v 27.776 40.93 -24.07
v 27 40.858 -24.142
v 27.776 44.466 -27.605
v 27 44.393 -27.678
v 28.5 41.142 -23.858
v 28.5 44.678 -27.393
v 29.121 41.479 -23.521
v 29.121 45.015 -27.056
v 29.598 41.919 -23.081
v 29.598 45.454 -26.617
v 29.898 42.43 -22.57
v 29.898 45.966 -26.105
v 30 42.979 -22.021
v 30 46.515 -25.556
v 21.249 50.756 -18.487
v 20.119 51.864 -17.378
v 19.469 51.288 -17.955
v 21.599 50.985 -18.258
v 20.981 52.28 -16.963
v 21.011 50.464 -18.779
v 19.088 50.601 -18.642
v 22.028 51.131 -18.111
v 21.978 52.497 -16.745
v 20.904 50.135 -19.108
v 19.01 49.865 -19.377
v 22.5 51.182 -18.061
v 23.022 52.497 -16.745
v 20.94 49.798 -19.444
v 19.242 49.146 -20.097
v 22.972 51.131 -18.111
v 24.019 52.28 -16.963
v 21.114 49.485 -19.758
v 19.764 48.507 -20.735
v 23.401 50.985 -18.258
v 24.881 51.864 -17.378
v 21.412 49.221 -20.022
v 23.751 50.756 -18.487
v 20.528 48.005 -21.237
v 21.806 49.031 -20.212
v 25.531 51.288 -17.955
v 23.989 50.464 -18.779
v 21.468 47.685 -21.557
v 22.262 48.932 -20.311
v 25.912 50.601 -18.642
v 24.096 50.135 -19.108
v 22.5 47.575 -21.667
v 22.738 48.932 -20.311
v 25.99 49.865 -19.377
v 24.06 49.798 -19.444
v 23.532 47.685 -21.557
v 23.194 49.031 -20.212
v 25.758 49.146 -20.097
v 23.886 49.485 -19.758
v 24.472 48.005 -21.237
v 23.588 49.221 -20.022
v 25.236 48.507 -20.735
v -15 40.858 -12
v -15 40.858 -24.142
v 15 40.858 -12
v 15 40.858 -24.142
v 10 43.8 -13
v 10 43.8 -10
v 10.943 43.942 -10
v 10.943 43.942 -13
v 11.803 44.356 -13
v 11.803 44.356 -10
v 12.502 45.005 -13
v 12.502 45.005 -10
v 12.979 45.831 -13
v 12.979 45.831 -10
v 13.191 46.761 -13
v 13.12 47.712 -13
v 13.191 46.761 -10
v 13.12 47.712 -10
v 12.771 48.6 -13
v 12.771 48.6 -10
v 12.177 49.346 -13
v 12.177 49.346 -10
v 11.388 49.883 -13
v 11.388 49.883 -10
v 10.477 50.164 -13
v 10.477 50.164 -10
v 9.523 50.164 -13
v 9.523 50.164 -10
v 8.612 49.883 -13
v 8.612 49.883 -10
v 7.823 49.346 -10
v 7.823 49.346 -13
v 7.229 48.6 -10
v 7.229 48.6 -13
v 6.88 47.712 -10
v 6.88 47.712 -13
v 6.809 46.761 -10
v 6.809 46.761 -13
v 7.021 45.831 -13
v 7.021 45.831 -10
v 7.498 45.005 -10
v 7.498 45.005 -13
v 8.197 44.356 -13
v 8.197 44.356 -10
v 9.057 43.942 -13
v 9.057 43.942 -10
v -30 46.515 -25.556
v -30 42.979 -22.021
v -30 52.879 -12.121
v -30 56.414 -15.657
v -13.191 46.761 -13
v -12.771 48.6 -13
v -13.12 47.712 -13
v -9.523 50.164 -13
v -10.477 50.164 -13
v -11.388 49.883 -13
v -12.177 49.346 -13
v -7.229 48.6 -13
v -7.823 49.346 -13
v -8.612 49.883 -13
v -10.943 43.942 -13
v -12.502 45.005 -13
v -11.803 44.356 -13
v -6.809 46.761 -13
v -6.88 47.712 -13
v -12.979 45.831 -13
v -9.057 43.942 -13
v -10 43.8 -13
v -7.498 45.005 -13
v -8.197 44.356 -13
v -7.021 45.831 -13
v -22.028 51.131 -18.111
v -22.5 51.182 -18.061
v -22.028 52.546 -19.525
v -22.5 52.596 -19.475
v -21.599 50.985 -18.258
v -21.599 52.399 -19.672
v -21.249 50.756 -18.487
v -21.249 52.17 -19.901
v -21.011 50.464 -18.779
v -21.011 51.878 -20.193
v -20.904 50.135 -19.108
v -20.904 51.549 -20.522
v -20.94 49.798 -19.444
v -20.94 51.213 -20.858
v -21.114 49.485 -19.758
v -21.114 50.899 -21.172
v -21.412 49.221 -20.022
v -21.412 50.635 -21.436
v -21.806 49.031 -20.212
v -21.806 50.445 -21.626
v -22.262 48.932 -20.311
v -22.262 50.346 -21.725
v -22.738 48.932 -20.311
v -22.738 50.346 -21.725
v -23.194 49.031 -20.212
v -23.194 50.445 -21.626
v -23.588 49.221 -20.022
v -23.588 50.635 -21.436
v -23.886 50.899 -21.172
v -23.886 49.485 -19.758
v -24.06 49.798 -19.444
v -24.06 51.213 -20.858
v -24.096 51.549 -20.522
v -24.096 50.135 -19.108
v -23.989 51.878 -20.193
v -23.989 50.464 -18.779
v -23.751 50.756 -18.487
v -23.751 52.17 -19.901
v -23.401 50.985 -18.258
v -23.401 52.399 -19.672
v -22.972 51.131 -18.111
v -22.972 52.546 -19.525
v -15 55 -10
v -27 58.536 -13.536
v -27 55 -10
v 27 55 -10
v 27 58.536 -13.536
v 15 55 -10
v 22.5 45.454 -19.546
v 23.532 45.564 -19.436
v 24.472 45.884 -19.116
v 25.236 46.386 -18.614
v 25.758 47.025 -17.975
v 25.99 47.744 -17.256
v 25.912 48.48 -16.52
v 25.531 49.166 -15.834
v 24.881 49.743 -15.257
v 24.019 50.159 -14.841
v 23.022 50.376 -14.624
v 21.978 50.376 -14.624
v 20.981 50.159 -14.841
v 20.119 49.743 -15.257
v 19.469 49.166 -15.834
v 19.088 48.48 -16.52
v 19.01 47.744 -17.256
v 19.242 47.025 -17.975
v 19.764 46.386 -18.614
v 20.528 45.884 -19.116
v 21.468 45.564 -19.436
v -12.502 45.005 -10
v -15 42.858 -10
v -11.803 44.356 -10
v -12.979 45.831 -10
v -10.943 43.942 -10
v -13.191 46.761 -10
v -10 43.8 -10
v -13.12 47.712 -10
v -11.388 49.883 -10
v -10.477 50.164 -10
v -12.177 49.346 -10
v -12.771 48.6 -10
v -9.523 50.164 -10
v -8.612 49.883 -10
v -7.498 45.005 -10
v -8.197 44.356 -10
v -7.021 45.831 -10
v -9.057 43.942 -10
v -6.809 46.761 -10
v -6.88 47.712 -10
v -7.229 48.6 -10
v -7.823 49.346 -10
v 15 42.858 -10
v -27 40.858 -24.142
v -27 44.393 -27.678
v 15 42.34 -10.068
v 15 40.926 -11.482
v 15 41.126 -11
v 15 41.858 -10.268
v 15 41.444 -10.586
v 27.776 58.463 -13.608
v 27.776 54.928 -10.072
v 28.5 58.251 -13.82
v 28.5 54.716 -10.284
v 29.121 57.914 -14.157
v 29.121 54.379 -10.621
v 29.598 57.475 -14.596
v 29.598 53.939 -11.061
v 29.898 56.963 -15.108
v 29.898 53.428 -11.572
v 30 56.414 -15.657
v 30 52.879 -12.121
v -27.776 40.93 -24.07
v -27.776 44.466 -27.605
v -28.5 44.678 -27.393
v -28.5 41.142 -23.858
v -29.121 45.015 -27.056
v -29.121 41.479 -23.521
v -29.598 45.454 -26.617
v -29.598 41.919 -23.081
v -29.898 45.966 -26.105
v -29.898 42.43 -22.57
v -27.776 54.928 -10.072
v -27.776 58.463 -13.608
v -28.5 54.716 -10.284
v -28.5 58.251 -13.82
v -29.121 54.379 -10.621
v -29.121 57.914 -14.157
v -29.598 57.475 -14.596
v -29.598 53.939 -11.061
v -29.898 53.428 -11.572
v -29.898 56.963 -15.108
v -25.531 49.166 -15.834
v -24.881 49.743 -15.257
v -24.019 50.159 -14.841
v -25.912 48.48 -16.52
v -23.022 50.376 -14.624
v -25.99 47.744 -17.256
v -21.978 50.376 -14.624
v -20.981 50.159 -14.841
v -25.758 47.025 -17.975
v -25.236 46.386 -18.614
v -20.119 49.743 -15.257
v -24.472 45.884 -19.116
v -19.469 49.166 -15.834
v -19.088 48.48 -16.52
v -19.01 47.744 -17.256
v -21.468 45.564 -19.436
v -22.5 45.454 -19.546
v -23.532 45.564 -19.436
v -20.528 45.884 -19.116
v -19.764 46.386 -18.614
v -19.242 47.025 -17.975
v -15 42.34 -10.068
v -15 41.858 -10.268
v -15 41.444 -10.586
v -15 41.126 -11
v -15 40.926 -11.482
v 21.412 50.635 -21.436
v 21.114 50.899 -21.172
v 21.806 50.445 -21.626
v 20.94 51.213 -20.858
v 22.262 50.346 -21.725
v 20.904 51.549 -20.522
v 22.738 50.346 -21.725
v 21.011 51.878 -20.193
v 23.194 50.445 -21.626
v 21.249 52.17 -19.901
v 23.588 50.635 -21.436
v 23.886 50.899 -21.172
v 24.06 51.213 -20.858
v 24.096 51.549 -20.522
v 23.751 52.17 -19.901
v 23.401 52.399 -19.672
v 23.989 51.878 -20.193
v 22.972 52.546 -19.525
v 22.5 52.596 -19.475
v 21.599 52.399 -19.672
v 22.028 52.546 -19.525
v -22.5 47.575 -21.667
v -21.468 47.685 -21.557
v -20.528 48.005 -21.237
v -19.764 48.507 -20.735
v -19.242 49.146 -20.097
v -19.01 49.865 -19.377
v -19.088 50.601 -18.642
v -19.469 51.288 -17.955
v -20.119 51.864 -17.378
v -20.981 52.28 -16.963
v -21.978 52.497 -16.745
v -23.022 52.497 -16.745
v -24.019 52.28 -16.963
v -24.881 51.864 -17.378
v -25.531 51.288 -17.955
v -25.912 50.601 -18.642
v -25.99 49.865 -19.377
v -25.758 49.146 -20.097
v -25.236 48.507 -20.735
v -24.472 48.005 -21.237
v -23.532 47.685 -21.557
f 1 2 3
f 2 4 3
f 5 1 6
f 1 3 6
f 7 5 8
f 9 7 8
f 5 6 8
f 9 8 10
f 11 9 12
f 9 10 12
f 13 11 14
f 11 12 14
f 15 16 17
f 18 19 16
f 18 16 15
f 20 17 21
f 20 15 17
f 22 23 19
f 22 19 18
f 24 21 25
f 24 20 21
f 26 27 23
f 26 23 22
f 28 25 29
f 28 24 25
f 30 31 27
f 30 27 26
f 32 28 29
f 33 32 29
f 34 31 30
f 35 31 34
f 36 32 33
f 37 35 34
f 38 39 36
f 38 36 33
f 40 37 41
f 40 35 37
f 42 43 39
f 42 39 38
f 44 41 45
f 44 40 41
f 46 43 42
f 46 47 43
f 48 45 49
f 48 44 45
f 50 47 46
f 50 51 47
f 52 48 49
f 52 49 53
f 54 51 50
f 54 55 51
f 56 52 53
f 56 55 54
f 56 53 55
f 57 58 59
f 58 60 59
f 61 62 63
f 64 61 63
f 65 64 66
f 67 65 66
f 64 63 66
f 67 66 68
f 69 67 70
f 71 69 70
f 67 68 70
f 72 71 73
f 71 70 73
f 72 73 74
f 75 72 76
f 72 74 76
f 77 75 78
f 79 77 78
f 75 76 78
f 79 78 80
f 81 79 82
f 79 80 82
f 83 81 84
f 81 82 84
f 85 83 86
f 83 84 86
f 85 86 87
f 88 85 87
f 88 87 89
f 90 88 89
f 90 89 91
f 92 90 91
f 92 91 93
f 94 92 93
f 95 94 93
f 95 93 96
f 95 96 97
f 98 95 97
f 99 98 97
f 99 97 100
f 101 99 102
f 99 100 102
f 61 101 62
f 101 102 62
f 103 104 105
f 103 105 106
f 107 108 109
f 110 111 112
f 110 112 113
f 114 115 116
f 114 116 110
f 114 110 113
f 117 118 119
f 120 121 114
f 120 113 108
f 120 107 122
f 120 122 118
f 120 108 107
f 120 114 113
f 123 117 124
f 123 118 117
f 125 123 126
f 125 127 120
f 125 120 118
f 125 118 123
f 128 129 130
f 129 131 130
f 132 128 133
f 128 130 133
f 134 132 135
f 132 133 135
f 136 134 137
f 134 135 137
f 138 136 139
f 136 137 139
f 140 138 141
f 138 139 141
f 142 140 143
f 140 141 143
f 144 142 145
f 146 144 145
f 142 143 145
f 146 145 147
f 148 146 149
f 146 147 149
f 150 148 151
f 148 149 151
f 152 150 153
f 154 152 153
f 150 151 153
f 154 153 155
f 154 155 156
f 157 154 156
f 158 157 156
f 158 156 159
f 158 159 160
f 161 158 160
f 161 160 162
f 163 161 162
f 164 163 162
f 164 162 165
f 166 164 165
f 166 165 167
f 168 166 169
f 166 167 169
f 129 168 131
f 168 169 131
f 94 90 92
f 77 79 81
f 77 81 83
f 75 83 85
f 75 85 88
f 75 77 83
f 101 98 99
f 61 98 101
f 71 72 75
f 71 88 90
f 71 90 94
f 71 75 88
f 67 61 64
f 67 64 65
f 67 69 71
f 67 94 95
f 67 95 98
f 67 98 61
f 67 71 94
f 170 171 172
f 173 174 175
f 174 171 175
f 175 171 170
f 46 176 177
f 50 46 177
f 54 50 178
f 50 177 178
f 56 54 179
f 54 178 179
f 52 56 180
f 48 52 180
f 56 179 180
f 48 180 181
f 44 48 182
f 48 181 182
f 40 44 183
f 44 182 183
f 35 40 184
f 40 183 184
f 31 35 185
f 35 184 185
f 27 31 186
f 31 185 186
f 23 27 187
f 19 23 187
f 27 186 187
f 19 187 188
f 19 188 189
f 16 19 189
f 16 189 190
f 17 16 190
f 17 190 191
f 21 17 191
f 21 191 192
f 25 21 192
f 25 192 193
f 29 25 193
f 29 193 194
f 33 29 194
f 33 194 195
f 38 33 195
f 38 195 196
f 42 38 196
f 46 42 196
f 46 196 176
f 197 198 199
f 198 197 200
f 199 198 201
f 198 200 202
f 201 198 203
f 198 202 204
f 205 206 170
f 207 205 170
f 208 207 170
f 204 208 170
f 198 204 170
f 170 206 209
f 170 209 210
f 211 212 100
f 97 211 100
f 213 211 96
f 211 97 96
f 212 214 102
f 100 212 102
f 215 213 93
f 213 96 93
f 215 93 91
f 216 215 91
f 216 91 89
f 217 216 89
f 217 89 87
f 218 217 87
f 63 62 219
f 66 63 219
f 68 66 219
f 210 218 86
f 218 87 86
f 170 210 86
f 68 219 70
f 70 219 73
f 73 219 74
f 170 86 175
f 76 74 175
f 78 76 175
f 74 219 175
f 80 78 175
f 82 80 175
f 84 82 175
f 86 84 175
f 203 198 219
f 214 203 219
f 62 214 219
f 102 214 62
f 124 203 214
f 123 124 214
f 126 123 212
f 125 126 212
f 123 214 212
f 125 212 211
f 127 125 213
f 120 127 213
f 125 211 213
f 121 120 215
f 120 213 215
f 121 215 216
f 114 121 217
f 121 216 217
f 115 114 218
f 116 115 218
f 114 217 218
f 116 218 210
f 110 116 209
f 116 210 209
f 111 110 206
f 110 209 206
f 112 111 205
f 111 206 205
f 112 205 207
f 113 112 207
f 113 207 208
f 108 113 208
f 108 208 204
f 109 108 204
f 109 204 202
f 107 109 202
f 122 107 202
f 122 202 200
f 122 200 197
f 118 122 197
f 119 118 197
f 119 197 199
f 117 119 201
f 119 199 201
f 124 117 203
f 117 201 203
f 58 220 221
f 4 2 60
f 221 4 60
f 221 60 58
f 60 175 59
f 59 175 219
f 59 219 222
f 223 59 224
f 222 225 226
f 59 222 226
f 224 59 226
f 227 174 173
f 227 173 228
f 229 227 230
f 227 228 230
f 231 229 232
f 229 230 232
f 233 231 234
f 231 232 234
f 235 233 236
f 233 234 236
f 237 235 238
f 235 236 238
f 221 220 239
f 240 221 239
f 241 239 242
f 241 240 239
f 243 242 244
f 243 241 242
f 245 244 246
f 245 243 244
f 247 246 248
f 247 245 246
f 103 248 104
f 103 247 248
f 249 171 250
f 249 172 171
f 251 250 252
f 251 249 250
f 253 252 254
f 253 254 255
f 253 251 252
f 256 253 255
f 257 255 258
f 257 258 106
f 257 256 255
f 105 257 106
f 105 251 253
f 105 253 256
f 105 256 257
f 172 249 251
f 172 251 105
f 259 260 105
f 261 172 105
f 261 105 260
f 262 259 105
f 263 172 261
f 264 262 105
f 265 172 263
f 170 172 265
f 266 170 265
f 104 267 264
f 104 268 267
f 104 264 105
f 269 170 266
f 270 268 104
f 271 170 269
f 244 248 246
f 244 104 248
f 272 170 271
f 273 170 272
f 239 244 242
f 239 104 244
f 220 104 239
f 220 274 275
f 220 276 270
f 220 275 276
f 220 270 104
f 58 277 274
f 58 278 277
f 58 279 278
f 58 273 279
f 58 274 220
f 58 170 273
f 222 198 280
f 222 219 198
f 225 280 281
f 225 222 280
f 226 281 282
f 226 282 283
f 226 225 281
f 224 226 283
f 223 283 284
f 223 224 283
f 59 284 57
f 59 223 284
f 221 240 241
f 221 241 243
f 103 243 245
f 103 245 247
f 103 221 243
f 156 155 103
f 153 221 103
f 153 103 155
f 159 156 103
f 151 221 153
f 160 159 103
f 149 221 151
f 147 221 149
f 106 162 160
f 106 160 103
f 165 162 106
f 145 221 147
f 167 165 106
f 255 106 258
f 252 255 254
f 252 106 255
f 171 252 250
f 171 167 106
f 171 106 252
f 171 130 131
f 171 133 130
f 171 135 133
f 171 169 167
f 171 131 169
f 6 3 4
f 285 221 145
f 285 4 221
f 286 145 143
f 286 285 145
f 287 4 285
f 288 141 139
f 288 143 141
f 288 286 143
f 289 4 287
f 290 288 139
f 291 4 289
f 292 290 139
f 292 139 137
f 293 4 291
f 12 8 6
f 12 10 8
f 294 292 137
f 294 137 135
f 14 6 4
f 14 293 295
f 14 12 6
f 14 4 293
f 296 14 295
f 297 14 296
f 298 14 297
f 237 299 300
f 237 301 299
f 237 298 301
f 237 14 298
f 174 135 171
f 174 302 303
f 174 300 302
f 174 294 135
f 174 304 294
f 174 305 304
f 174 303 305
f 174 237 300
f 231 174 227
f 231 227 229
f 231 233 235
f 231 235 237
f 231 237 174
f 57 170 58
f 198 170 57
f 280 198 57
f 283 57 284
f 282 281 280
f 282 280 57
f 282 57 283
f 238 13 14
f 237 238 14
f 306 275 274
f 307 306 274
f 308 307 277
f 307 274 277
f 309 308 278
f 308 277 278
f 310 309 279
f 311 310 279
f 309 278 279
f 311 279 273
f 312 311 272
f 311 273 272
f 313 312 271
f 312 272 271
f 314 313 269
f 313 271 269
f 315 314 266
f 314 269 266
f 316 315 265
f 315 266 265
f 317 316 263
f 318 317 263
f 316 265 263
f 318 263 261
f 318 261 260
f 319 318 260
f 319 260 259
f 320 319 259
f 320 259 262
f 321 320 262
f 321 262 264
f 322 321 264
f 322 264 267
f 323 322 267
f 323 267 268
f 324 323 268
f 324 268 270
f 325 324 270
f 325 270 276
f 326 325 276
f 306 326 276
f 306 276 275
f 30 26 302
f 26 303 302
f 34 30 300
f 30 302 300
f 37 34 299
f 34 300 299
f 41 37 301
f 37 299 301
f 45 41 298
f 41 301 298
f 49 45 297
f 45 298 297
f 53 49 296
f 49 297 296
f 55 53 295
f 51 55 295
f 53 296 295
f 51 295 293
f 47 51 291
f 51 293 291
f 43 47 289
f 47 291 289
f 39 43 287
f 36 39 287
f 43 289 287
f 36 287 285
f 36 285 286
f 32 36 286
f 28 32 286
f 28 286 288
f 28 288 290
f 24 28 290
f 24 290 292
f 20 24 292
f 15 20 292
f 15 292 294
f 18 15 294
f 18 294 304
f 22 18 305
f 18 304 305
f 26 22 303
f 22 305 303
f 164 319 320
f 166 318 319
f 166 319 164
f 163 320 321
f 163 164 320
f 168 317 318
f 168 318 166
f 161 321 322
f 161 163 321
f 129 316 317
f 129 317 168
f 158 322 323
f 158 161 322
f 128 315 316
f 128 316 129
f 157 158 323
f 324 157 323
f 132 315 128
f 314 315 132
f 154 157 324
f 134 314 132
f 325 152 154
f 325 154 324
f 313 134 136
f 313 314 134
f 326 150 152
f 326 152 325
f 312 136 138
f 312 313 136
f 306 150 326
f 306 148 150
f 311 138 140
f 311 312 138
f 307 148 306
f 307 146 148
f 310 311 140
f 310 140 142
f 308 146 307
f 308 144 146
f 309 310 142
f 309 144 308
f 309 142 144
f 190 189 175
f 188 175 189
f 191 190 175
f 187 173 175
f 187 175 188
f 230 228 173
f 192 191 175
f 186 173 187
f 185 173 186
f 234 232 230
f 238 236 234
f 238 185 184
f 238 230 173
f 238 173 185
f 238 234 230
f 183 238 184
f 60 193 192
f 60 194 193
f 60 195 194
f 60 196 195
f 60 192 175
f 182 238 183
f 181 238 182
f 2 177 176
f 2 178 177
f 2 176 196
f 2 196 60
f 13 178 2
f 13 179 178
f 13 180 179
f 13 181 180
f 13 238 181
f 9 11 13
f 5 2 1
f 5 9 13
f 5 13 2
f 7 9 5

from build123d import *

# Parameters (mm, degrees)
PAD004_DEPTH     = 15
PAD005_DEPTH     = 30
SKETCH009_R      = 3.2
POCKET003_DEPTH  = 3
HOLE_D           = 3.2
HOLE_CBORE_D     = 7
HOLE_CBORE_DEPTH = 3
FILLET_R         = 2
FILLET001_R      = 3


with BuildPart() as part:
    # Sketch007 → Pad004 (new body, symmetric)
    with BuildSketch(Plane.YZ):
        Polygon((0, 0), (-14.142136, -14.142136), (-14.142136, 0), align=None)
    extrude(amount=PAD004_DEPTH, both=True)

    # Sketch008 → Pad005 (join, symmetric)
    with BuildSketch(Plane.YZ):
        Polygon((0, 0), (-14.142136, -14.142136), (-10.606602, -17.67767), (3.535534, -3.535534), align=None)
    extrude(amount=PAD005_DEPTH, both=True)

    # Sketch009 (on Face3 of Pad005) → Pocket003 (cut)
    with BuildSketch(Plane(origin=(0, 0, 0), x_dir=(0, -1, 0), z_dir=(0, 0, 1))):
        with Locations((8, 10)):
            Circle(SKETCH009_R)
        with Locations((8, -10)):
            Circle(SKETCH009_R)
    extrude(amount=-POCKET003_DEPTH, mode=Mode.SUBTRACT)

    # Hole (through all)
    with Locations(Plane(origin=(0, 0, 0), x_dir=(0, -0.707107, -0.707107), z_dir=(0, -0.707107, 0.707107))):
        with Locations((10, 22.5), (10, -22.5)):
            CounterBoreHole(HOLE_D / 2, HOLE_CBORE_D / 2, HOLE_CBORE_DEPTH)

    # Fillet
    fillet_edges = [part.edges().sort_by_distance(p)[0] for p in [
        (0, -14.142136, 0),
    ]]
    fillet(fillet_edges, radius=FILLET_R)

    # Fillet001
    fillet001_edges = [part.edges().sort_by_distance(p)[0] for p in [
        (-30, 1.767767, -1.767767),
        (-30, -12.374369, -15.909903),
        (30, 1.767767, -1.767767),
        (30, -12.374369, -15.909903),
    ]]
    fillet(fillet001_edges, radius=FILLET001_R)


with BuildPart() as part_1:
    # Body002 placement: moved
    add(part.part.moved(Location((0, 55, -10))))


solid = part_1.part
